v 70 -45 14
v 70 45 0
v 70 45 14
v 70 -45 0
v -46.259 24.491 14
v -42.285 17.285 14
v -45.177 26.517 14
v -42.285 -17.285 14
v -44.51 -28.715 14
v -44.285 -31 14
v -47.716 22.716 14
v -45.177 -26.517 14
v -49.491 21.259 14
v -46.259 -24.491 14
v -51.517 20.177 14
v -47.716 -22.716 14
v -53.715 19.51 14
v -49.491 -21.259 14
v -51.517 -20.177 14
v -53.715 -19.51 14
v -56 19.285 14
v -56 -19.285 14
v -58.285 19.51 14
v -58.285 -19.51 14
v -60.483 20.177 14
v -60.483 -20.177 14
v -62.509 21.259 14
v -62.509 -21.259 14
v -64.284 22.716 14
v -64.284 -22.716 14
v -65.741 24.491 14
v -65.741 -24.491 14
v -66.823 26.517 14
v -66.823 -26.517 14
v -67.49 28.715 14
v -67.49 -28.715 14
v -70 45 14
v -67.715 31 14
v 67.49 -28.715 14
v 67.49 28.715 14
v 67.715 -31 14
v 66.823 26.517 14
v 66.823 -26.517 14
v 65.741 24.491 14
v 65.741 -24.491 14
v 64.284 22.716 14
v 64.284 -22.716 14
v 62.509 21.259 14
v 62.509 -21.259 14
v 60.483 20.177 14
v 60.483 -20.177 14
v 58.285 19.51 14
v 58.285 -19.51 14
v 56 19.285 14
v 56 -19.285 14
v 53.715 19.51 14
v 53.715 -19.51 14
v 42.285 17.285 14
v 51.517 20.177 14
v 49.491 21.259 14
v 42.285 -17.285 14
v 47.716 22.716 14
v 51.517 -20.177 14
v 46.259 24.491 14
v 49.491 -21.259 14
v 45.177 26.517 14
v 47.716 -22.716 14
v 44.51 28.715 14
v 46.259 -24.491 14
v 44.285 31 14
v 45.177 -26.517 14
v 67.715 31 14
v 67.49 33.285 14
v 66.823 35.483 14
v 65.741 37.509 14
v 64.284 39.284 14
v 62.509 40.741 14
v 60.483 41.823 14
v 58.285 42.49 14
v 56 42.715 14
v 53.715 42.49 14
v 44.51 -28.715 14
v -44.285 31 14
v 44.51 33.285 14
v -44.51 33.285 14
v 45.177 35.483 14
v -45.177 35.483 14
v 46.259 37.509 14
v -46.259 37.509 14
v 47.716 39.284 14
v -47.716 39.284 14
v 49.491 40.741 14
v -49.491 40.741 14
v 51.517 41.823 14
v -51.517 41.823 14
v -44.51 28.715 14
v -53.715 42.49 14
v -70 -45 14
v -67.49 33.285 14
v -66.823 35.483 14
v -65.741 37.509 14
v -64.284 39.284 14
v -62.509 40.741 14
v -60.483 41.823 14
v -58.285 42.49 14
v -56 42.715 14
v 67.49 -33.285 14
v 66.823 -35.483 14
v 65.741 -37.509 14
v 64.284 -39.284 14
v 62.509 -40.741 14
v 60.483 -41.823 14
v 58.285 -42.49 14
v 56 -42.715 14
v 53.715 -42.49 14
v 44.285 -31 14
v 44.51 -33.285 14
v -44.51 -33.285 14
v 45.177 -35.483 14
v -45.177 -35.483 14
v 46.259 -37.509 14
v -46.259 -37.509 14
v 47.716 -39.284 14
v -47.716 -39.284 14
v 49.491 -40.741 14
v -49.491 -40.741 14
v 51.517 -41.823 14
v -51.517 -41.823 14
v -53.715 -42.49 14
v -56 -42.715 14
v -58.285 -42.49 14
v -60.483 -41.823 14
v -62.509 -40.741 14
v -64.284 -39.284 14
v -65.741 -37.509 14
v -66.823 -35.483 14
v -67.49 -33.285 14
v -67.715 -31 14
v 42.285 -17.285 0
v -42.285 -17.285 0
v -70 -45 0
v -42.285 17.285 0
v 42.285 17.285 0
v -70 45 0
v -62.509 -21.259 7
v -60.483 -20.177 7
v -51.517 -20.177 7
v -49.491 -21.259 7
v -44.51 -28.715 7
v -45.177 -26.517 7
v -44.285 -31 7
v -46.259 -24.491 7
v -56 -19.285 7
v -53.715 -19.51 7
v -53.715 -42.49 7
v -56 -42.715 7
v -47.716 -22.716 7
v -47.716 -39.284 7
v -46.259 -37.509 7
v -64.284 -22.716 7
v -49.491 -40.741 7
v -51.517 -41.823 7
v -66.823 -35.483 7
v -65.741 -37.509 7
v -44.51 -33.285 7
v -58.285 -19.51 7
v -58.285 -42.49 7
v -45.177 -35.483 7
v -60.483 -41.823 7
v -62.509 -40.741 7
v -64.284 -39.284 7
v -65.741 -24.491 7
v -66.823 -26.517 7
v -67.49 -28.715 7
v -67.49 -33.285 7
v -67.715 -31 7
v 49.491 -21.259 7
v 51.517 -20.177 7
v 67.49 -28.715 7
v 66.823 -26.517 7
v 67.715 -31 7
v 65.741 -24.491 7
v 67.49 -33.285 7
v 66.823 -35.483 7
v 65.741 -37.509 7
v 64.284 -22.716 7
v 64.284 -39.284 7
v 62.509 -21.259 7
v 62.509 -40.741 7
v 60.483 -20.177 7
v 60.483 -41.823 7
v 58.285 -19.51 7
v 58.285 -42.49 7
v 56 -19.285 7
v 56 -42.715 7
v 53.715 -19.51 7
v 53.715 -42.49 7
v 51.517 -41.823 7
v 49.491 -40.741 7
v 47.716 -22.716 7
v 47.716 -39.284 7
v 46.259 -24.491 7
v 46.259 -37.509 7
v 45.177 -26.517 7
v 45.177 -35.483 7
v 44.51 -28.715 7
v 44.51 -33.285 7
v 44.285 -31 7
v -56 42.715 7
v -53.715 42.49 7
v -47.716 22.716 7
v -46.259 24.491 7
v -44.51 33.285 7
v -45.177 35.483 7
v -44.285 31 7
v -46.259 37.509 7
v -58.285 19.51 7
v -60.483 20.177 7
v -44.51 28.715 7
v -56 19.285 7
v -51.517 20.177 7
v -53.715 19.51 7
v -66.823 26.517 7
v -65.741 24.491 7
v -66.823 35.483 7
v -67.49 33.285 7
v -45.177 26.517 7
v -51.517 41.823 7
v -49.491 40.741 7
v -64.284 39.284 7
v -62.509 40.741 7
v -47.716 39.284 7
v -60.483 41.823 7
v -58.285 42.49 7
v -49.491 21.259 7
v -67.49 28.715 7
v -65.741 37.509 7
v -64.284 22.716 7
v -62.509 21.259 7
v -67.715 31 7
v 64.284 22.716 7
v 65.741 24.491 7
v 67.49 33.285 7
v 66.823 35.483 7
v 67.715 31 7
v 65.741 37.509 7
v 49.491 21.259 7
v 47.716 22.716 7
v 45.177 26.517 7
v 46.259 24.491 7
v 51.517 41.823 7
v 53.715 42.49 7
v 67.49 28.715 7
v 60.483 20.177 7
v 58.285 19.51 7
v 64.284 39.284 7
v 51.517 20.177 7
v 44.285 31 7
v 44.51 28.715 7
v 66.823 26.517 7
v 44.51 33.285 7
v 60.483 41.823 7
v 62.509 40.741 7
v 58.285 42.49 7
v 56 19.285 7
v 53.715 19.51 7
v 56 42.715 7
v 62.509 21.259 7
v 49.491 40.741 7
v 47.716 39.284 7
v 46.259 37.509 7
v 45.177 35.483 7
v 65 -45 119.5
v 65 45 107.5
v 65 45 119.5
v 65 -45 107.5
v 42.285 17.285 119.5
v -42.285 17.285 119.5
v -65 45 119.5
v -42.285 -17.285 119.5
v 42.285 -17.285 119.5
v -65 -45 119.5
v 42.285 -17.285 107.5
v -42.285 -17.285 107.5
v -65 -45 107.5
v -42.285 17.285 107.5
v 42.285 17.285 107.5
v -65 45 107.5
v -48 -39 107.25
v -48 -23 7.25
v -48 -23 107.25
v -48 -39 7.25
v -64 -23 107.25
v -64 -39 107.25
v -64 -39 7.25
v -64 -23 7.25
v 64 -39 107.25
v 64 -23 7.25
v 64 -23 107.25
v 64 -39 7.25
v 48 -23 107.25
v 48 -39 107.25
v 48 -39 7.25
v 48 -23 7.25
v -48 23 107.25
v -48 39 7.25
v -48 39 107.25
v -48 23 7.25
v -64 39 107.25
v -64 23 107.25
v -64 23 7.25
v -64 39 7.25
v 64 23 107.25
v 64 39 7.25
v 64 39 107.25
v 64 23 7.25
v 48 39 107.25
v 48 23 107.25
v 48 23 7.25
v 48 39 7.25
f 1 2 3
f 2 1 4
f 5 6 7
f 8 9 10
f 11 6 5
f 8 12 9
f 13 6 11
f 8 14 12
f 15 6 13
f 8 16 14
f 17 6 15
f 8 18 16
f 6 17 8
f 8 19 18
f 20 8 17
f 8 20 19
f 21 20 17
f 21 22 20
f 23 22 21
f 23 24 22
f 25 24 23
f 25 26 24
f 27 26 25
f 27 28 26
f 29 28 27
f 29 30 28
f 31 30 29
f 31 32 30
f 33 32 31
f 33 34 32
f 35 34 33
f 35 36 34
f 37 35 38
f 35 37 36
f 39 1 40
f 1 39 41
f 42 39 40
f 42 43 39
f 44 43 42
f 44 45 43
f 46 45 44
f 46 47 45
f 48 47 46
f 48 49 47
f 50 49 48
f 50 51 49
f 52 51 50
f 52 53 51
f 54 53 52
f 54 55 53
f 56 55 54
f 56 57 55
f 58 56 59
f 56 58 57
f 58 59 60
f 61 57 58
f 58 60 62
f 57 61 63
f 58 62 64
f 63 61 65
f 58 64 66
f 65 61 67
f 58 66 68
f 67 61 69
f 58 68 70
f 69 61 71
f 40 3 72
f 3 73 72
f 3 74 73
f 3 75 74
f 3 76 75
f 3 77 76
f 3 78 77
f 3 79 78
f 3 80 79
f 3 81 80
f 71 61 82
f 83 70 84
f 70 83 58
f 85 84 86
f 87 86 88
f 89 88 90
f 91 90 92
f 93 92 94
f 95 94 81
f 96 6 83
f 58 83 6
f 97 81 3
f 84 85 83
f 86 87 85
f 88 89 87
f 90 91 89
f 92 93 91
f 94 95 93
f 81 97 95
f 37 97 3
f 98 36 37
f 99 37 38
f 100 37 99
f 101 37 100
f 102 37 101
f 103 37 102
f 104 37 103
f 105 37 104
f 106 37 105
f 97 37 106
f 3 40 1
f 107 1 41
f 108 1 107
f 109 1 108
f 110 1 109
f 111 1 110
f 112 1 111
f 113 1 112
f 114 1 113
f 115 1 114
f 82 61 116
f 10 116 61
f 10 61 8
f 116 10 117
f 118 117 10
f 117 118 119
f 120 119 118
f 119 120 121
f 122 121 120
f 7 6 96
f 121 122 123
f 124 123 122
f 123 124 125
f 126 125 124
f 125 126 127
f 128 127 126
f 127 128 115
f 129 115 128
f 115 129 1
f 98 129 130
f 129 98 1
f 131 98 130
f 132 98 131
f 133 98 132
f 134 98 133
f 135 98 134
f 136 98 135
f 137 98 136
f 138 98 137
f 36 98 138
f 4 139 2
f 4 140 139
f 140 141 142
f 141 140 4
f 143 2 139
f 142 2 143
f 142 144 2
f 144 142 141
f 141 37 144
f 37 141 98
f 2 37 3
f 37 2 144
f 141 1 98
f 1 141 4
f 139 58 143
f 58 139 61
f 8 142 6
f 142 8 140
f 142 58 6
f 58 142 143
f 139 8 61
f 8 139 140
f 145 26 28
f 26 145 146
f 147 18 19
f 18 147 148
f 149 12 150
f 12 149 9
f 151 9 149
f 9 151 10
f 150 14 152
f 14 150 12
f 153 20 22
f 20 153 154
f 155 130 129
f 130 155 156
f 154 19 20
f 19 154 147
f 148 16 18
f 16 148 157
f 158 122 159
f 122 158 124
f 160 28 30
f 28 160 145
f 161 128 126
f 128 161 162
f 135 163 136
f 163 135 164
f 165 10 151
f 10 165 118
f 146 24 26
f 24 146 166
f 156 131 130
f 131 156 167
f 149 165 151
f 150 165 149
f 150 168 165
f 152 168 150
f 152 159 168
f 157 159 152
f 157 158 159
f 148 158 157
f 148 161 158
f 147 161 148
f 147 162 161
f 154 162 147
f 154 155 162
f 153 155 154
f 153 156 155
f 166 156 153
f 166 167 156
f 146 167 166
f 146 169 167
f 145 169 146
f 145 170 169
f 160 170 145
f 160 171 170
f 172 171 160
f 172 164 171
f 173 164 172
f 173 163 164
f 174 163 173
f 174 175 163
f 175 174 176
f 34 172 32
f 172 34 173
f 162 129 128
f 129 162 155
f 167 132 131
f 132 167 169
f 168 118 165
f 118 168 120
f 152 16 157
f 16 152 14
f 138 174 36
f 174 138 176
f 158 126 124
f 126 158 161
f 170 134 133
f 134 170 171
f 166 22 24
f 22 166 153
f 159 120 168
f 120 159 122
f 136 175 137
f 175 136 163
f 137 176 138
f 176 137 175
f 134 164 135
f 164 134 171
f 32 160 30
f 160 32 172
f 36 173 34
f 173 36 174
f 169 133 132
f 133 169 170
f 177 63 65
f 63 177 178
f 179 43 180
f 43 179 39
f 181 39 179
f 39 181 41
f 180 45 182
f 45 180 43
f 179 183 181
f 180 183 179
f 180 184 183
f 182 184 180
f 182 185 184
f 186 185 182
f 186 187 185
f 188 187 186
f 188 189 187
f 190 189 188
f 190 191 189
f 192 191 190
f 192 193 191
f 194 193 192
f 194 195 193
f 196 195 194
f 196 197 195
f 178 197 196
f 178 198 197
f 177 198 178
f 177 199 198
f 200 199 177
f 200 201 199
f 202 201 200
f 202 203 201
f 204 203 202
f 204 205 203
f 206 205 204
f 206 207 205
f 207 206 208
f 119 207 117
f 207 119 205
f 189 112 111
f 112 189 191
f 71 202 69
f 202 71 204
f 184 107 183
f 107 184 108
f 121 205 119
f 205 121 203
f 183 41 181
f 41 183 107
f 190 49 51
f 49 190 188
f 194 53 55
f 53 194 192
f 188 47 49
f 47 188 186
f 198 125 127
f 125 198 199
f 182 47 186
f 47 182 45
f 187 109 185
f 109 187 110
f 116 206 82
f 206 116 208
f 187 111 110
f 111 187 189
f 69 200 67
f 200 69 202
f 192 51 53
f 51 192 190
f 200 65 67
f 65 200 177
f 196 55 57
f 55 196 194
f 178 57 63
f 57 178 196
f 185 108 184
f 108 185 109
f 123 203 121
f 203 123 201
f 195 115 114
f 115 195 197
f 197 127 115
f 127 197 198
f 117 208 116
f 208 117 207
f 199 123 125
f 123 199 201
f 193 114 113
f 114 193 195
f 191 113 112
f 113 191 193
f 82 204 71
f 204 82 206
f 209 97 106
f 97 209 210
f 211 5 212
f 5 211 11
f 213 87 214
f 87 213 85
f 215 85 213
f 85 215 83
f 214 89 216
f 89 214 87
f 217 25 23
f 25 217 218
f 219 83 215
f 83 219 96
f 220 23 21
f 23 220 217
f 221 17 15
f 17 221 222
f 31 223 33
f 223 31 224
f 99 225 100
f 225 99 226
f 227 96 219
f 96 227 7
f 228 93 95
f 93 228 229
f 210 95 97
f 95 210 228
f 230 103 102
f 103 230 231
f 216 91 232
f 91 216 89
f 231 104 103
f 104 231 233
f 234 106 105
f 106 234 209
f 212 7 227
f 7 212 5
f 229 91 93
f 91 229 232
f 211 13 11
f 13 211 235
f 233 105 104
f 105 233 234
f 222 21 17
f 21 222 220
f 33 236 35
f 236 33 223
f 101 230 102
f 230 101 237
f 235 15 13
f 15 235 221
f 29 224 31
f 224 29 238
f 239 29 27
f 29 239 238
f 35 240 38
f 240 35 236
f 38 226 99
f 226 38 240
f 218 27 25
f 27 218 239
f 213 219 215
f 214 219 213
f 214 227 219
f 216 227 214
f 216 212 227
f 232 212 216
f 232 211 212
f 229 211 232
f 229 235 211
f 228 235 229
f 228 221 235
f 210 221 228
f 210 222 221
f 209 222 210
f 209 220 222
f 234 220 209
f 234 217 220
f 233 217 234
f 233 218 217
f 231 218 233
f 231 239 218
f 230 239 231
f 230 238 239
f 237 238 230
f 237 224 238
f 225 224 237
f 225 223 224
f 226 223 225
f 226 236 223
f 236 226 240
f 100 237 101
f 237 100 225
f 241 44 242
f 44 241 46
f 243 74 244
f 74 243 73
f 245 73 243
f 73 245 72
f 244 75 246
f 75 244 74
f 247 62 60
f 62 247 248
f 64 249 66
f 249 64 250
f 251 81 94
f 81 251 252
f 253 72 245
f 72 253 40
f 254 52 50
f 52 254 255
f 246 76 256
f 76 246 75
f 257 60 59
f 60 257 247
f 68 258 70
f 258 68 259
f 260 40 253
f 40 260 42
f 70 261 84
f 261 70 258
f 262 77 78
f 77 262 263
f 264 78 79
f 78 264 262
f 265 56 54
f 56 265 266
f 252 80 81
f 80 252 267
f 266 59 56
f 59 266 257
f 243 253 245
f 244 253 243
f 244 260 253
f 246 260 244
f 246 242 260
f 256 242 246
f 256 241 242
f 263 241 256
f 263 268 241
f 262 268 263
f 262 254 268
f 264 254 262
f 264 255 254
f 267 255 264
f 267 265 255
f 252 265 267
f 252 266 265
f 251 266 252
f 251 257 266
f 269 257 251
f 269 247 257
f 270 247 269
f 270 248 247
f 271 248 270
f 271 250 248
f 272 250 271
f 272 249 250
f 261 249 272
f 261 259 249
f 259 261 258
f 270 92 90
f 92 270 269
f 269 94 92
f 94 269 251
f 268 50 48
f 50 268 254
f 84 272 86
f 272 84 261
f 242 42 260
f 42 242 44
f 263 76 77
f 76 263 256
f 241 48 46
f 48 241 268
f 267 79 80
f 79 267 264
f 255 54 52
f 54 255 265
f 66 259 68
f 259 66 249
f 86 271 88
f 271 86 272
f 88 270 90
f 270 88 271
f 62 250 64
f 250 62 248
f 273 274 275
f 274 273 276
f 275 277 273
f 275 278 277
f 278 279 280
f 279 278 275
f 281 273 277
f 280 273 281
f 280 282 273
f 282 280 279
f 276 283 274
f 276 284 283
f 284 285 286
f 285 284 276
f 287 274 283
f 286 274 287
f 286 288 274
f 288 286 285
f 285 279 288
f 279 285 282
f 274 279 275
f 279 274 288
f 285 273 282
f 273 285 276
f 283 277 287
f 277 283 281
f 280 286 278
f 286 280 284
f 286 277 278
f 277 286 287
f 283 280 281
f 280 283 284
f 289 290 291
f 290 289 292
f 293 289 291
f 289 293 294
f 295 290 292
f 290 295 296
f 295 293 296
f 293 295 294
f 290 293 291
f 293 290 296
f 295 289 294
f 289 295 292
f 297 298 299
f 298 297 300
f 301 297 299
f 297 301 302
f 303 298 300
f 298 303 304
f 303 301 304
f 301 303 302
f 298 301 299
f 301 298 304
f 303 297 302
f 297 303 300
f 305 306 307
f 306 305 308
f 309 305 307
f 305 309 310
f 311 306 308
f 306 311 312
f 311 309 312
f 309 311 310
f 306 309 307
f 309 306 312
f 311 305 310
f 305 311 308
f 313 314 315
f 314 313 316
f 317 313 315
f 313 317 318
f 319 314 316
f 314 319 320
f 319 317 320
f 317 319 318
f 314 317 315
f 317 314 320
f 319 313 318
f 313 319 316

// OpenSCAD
$fn = 32;

// ------------------------------------------------------------------------
// Frame cube: base 140 x 90 mm, posts 100 mm tall
// Every part is its own module, assembly() places every instance.
// ------------------------------------------------------------------------

// --- part 1 ---
module base_frame() {
  difference() {
    translate([-70, -45, 0]) cube([140, 90, 14]);
    translate([-42.285, -17.285, -1]) cube([84.57, 34.57, 16]);
    translate([-56, -31, 7]) cylinder(h = 8, d = 23.43);
    translate([56, -31, 7]) cylinder(h = 8, d = 23.43);
    translate([-56, 31, 7]) cylinder(h = 8, d = 23.43);
    translate([56, 31, 7]) cylinder(h = 8, d = 23.43);
  }
}

// --- part 2 ---
module corner_post() {
  translate([-8, -8, 0]) cube([16, 16, 100]);
}

// --- part 3 ---
module top_frame() {
  difference() {
    translate([-65, -45, 0]) cube([130, 90, 12]);
    translate([-42.285, -17.285, -1]) cube([84.57, 34.57, 14]);
  }
}

// --- assembly ---
module assembly() {
  color([0.80, 0.24, 0.20]) translate([0, 0, 0]) rotate([0, 0, 0]) base_frame();
  color([0.20, 0.45, 0.75]) translate([-56, -31, 7.25]) rotate([0, 0, 0]) corner_post();
  color([0.25, 0.62, 0.32]) translate([56, -31, 7.25]) rotate([0, 0, 0]) corner_post();
  color([0.92, 0.70, 0.18]) translate([-56, 31, 7.25]) rotate([0, 0, 0]) corner_post();
  color([0.58, 0.35, 0.70]) translate([56, 31, 7.25]) rotate([0, 0, 0]) corner_post();
  color([0.16, 0.66, 0.66]) translate([0, 0, 107.5]) rotate([0, 0, 0]) top_frame();
}

assembly();
